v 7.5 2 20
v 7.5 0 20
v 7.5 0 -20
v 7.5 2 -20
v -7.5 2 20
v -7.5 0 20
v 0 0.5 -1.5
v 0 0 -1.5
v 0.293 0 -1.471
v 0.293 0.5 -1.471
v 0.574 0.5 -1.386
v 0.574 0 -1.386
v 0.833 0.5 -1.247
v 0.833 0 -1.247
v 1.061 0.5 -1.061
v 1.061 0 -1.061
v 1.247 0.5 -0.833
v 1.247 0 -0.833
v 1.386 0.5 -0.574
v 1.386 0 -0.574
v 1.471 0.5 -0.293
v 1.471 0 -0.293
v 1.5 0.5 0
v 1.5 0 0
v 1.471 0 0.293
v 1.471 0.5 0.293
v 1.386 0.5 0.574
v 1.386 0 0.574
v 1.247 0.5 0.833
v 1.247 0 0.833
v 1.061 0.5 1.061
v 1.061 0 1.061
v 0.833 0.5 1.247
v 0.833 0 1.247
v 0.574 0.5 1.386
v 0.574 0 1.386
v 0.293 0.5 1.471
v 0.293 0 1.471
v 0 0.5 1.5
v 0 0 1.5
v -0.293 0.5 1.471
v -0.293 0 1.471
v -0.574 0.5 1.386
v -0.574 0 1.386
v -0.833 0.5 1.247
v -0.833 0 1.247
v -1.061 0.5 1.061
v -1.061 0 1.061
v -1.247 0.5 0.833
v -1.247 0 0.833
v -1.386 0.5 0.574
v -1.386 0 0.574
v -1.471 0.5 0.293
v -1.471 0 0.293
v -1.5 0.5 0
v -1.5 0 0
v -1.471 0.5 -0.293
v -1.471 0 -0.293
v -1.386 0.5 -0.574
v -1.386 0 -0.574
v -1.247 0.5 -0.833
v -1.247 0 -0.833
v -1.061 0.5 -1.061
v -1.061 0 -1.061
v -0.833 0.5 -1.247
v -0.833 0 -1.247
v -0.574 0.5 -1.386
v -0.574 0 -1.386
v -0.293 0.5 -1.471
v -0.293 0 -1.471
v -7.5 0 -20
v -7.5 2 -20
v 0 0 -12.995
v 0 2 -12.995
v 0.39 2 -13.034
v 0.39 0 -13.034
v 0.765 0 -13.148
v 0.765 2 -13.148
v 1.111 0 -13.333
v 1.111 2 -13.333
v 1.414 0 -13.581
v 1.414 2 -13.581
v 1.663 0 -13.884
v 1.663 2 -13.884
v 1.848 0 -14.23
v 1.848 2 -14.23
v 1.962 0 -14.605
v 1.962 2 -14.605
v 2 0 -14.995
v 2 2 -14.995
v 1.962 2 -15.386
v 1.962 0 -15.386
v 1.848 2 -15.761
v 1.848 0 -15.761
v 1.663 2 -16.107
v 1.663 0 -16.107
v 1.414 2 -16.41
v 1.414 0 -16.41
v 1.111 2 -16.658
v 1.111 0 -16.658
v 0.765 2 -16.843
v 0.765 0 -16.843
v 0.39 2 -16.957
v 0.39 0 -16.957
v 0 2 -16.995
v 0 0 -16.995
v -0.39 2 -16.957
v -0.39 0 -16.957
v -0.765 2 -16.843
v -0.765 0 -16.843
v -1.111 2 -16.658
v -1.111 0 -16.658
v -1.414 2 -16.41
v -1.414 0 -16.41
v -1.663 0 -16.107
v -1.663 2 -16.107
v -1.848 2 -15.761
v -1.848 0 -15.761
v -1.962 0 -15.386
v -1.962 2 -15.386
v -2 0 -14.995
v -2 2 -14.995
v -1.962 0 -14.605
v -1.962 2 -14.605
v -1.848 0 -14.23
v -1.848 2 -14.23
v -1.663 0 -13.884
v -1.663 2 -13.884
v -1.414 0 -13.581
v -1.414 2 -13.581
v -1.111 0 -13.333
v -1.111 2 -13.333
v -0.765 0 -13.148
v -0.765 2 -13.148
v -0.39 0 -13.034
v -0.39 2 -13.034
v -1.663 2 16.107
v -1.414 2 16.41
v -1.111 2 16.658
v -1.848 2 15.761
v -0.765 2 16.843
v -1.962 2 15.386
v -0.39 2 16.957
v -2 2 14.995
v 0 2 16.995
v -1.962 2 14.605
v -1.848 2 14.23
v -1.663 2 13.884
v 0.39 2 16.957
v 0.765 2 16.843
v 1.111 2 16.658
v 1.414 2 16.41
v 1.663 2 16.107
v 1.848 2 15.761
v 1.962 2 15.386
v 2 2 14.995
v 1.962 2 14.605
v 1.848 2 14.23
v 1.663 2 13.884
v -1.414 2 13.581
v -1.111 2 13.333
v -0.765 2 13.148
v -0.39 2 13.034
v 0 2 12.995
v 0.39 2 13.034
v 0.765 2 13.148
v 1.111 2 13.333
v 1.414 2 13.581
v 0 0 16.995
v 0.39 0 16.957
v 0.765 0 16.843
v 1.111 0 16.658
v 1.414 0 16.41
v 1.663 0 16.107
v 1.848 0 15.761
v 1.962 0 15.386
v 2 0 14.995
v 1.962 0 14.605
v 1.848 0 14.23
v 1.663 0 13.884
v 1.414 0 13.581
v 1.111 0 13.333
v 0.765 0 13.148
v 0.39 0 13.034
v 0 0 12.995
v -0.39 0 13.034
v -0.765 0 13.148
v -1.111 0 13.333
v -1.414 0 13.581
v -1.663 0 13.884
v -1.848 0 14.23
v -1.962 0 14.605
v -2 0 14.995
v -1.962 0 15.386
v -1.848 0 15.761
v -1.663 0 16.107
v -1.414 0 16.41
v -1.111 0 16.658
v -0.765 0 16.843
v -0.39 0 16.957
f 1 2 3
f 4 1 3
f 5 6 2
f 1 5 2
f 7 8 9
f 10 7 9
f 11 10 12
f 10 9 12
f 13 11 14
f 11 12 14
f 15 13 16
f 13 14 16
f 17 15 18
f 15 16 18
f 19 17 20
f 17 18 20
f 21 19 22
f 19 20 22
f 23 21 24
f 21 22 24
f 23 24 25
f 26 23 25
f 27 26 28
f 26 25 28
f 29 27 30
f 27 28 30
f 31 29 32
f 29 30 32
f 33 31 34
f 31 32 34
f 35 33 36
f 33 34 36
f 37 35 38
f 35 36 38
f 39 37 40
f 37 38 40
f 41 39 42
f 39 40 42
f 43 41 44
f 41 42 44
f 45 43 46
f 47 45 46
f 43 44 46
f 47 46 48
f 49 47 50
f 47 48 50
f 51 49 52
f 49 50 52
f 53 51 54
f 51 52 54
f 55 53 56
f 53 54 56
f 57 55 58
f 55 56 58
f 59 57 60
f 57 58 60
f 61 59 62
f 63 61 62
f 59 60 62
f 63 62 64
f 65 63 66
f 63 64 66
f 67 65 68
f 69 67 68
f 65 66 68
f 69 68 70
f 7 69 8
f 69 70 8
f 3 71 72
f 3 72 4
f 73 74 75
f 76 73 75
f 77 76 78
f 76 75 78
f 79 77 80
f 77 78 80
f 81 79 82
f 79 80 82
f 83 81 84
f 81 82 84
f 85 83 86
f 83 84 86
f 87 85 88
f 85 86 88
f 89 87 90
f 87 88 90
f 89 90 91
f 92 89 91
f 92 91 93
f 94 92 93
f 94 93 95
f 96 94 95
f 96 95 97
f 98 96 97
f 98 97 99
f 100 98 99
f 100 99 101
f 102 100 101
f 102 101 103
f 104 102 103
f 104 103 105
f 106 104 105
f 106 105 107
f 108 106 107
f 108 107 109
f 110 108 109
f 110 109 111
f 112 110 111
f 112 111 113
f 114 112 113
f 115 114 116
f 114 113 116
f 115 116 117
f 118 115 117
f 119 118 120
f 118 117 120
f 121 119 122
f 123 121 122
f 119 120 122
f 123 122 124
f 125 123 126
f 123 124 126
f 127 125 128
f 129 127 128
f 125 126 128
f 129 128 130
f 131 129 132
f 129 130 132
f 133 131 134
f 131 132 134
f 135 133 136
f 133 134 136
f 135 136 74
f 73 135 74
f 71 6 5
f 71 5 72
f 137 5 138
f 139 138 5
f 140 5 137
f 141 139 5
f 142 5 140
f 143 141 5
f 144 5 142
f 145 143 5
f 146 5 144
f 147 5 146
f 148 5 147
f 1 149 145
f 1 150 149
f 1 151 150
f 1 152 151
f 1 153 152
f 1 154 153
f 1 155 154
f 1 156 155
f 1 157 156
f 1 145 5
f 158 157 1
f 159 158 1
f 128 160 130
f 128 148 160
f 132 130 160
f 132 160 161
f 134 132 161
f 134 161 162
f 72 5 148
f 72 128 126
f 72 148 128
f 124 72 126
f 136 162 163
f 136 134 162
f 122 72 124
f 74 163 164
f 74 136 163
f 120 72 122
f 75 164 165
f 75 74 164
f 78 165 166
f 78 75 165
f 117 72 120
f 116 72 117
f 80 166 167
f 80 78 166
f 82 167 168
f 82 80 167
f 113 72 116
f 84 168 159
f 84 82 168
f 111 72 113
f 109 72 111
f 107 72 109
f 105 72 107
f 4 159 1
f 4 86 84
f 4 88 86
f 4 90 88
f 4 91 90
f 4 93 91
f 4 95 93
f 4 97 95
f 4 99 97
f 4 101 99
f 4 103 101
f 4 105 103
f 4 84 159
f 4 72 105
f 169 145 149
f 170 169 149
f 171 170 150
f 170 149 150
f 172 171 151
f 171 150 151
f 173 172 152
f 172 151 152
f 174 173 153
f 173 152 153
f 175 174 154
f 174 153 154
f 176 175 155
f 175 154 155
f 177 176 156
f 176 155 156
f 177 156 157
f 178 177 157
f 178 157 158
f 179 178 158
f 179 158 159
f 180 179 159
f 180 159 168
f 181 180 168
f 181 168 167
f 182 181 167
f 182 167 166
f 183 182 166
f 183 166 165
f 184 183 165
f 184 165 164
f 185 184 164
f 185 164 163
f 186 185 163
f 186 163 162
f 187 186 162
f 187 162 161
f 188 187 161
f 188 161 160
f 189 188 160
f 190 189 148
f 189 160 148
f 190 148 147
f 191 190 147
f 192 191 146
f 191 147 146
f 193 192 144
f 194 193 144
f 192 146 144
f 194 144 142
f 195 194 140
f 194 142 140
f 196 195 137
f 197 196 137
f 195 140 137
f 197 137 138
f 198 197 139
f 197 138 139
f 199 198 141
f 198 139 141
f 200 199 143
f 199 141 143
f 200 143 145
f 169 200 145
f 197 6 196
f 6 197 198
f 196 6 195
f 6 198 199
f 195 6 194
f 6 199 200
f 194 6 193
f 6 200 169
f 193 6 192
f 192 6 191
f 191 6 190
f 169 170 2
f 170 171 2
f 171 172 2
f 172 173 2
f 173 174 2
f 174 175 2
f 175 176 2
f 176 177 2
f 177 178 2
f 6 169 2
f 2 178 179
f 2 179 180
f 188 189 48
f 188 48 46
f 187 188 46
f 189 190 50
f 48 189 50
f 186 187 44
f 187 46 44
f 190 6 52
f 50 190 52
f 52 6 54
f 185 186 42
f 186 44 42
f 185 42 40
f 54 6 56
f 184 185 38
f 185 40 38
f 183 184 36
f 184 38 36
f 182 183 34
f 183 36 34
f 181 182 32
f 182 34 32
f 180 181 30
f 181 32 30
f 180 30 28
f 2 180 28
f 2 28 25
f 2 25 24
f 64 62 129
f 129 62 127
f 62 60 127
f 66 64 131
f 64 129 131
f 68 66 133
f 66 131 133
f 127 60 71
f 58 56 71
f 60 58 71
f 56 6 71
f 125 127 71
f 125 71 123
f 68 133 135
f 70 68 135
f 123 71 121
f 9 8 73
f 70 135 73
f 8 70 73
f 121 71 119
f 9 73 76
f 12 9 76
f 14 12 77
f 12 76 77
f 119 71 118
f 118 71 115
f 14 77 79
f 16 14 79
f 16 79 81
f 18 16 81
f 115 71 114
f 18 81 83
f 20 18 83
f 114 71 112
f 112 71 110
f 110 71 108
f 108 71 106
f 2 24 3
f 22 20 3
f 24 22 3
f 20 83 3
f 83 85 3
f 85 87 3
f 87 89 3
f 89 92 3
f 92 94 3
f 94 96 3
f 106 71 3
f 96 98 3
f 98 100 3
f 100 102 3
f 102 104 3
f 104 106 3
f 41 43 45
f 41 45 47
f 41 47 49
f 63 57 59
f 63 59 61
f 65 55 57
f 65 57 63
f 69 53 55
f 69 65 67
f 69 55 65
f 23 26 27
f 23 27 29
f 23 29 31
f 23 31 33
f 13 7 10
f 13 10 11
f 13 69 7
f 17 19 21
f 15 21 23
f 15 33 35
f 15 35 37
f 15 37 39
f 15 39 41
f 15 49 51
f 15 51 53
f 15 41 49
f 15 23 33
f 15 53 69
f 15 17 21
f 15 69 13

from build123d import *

# Parameters (mm, degrees)
SKETCH2_W           = 15
SKETCH2_H           = 40
BOSS_EXTRUDE1_DEPTH = 2
SKETCH3_R           = 1.5
CUT_EXTRUDE1_DEPTH  = 0.5
SKETCH4_R           = 2
CUT_EXTRUDE2_DEPTH  = 10


with BuildPart() as part:
    # Sketch2 → Boss-Extrude1 (new body)
    with BuildSketch(Plane(origin=(0, 0, 0), x_dir=(1, 0, 0), z_dir=(0, 1, 0))):
        Rectangle(SKETCH2_W, SKETCH2_H)
    extrude(amount=BOSS_EXTRUDE1_DEPTH)

    # Sketch3 → Cut-Extrude1 (cut)
    with BuildSketch(Plane(origin=(0, 0, 0), x_dir=(-1, 0, 0), z_dir=(0, -1, 0))):
        with Locations(Location((0, 0, 0), (0, 0, 90))):
            Circle(SKETCH3_R)
    extrude(amount=-CUT_EXTRUDE1_DEPTH, mode=Mode.SUBTRACT)

    # Sketch4 → Cut-Extrude2 (cut)
    with BuildSketch(Plane(origin=(0, 2, 0), x_dir=(1, 0, 0), z_dir=(0, 1, 0))):
        with Locations(Location((0, 14.995463788, 0), (0, 0, 270))):
            Circle(SKETCH4_R)
        with Locations(Location((0, -14.995463788, 0), (0, 0, 270))):
            Circle(SKETCH4_R)
    extrude(amount=-CUT_EXTRUDE2_DEPTH, mode=Mode.SUBTRACT)


solid = part.part
